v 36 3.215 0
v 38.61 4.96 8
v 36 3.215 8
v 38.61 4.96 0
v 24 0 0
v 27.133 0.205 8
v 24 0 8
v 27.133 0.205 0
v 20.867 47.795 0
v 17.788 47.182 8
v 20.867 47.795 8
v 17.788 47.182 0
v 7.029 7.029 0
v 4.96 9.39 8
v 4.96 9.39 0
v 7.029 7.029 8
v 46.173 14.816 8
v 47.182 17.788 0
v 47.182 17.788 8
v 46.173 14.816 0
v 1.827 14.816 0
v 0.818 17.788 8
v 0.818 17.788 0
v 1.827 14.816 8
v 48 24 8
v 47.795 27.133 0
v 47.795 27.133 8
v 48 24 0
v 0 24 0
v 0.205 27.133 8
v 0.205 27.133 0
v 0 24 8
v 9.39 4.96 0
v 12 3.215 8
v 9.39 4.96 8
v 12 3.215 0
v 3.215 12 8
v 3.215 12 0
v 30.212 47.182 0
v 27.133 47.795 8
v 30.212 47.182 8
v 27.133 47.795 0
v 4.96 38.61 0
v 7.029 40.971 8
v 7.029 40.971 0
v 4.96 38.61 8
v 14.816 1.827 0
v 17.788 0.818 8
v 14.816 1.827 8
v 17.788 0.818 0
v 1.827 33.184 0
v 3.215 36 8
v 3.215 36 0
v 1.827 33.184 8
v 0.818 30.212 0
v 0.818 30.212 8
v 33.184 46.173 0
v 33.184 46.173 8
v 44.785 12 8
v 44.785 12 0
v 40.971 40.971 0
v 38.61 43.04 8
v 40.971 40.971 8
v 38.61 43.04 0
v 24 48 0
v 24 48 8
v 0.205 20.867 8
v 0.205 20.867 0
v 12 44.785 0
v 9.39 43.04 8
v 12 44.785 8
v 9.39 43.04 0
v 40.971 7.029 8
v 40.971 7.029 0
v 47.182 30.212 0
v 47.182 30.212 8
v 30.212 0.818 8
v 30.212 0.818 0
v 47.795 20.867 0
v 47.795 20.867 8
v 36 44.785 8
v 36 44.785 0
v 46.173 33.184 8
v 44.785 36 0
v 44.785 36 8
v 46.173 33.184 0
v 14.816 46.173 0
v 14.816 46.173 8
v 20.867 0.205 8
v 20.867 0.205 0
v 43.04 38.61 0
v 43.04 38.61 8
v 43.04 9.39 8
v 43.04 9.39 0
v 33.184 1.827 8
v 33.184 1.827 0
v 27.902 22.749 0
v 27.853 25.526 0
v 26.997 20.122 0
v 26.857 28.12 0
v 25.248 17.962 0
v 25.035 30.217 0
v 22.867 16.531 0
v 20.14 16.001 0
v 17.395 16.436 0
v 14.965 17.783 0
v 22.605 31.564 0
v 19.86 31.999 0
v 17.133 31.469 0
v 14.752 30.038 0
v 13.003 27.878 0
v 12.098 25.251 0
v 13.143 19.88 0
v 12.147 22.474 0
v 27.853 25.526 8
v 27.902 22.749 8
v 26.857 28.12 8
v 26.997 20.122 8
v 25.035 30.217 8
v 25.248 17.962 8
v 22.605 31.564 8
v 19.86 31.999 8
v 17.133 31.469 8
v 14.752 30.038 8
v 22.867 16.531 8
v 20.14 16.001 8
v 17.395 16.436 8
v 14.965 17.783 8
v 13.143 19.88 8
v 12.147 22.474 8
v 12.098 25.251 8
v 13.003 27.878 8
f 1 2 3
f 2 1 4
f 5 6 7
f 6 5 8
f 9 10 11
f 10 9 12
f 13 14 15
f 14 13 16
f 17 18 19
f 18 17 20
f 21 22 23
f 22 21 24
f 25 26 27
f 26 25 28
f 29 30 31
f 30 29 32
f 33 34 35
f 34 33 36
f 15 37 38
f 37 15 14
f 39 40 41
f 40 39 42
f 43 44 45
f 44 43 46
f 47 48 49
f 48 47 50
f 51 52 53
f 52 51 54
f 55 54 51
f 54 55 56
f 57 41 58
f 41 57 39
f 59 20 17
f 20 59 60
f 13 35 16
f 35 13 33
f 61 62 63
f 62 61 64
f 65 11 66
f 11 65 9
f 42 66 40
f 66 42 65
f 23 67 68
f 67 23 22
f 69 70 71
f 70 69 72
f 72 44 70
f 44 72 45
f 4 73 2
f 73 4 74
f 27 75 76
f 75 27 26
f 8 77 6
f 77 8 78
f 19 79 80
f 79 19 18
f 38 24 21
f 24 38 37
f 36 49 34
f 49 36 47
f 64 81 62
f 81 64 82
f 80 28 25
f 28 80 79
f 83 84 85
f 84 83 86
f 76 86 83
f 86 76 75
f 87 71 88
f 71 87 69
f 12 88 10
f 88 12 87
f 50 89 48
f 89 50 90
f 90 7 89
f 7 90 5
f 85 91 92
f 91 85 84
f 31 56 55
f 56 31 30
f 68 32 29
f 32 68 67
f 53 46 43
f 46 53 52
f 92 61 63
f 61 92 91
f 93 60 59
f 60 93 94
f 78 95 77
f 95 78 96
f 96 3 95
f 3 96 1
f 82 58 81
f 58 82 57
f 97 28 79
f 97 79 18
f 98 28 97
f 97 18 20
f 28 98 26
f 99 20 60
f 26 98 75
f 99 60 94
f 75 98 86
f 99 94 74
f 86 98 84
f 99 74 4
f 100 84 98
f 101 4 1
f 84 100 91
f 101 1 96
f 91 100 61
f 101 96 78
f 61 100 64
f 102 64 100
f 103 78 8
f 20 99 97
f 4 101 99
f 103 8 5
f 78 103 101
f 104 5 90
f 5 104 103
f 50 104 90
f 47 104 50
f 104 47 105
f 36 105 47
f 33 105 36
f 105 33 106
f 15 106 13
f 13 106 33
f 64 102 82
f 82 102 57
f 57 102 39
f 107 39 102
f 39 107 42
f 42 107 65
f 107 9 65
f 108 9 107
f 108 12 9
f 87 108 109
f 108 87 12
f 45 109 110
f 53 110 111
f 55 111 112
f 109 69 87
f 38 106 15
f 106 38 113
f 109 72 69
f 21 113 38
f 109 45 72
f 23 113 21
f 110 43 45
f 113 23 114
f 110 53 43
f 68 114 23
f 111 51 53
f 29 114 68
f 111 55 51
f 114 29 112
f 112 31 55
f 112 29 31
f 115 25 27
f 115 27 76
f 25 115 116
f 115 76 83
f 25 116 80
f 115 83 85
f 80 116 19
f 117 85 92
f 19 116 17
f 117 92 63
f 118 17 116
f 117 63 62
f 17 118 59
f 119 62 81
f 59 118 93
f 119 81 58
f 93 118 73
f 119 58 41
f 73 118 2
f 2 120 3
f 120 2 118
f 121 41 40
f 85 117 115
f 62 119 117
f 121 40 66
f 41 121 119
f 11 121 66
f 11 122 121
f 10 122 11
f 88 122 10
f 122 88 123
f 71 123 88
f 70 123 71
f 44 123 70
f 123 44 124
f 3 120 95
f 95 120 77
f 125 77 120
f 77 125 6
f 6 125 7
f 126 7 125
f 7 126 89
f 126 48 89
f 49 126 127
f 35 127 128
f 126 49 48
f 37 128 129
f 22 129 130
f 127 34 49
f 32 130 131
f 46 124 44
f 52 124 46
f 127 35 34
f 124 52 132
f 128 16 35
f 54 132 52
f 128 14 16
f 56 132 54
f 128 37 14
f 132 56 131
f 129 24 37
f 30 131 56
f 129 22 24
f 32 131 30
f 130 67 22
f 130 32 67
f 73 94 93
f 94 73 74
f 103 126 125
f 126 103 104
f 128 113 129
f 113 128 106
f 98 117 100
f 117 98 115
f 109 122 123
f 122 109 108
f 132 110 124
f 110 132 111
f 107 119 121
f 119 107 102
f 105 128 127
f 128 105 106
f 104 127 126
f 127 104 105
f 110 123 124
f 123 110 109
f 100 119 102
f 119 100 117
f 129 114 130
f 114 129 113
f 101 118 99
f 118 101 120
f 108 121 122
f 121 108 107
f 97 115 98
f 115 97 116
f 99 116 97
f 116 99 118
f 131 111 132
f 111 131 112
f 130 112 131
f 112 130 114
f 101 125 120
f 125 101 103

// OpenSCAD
$fn = 32;

// ----------------------------------------------------------------------
// Cam plate: eccentric cam, base R24
// ----------------------------------------------------------------------

// --- parameters (mm) ---
base_r = 24;              // base circle radius
lobe_h = 10;              // cam lobe rise
bore_r = 8;               // shaft bore radius
plate_t = 8;              // plate thickness, Z (extrusion height)
ecc = 4;                  // disc eccentricity
fit_tol = 0.1;            // declared fit tolerance (prompt contract)
free_tol = 0.5;           // declared free tolerance (prompt contract)

profile = [[48, 24], [47.795, 27.133], [47.182, 30.212], [46.173, 33.184], [44.785, 36], [43.04, 38.61], [40.971, 40.971], [38.61, 43.04], [36, 44.785], [33.184, 46.173], [30.212, 47.182], [27.133, 47.795], [24, 48], [20.867, 47.795], [17.788, 47.182], [14.816, 46.173], [12, 44.785], [9.39, 43.04], [7.029, 40.971], [4.96, 38.61], [3.215, 36], [1.827, 33.184], [0.818, 30.212], [0.205, 27.133], [0, 24], [0.205, 20.867], [0.818, 17.788], [1.827, 14.816], [3.215, 12], [4.96, 9.39], [7.029, 7.029], [9.39, 4.96], [12, 3.215], [14.816, 1.827], [17.788, 0.818], [20.867, 0.205], [24, 0], [27.133, 0.205], [30.212, 0.818], [33.184, 1.827], [36, 3.215], [38.61, 4.96], [40.971, 7.029], [43.04, 9.39], [44.785, 12], [46.173, 14.816], [47.182, 17.788], [47.795, 20.867]];  // primary outline, 48 points, counter clockwise
void_1 = [[27.853, 25.526], [26.857, 28.12], [25.035, 30.217], [22.605, 31.564], [19.86, 31.999], [17.133, 31.469], [14.752, 30.038], [13.003, 27.878], [12.098, 25.251], [12.147, 22.474], [13.143, 19.88], [14.965, 17.783], [17.395, 16.436], [20.14, 16.001], [22.867, 16.531], [25.248, 17.962], [26.997, 20.122], [27.902, 22.749]];  // shaft bore, 18 points

// --- the one profile operation ---
difference() {
  linear_extrude(height = plate_t) polygon(points = profile);
  translate([0, 0, -1])
    linear_extrude(height = plate_t + 2) polygon(points = void_1);
}
